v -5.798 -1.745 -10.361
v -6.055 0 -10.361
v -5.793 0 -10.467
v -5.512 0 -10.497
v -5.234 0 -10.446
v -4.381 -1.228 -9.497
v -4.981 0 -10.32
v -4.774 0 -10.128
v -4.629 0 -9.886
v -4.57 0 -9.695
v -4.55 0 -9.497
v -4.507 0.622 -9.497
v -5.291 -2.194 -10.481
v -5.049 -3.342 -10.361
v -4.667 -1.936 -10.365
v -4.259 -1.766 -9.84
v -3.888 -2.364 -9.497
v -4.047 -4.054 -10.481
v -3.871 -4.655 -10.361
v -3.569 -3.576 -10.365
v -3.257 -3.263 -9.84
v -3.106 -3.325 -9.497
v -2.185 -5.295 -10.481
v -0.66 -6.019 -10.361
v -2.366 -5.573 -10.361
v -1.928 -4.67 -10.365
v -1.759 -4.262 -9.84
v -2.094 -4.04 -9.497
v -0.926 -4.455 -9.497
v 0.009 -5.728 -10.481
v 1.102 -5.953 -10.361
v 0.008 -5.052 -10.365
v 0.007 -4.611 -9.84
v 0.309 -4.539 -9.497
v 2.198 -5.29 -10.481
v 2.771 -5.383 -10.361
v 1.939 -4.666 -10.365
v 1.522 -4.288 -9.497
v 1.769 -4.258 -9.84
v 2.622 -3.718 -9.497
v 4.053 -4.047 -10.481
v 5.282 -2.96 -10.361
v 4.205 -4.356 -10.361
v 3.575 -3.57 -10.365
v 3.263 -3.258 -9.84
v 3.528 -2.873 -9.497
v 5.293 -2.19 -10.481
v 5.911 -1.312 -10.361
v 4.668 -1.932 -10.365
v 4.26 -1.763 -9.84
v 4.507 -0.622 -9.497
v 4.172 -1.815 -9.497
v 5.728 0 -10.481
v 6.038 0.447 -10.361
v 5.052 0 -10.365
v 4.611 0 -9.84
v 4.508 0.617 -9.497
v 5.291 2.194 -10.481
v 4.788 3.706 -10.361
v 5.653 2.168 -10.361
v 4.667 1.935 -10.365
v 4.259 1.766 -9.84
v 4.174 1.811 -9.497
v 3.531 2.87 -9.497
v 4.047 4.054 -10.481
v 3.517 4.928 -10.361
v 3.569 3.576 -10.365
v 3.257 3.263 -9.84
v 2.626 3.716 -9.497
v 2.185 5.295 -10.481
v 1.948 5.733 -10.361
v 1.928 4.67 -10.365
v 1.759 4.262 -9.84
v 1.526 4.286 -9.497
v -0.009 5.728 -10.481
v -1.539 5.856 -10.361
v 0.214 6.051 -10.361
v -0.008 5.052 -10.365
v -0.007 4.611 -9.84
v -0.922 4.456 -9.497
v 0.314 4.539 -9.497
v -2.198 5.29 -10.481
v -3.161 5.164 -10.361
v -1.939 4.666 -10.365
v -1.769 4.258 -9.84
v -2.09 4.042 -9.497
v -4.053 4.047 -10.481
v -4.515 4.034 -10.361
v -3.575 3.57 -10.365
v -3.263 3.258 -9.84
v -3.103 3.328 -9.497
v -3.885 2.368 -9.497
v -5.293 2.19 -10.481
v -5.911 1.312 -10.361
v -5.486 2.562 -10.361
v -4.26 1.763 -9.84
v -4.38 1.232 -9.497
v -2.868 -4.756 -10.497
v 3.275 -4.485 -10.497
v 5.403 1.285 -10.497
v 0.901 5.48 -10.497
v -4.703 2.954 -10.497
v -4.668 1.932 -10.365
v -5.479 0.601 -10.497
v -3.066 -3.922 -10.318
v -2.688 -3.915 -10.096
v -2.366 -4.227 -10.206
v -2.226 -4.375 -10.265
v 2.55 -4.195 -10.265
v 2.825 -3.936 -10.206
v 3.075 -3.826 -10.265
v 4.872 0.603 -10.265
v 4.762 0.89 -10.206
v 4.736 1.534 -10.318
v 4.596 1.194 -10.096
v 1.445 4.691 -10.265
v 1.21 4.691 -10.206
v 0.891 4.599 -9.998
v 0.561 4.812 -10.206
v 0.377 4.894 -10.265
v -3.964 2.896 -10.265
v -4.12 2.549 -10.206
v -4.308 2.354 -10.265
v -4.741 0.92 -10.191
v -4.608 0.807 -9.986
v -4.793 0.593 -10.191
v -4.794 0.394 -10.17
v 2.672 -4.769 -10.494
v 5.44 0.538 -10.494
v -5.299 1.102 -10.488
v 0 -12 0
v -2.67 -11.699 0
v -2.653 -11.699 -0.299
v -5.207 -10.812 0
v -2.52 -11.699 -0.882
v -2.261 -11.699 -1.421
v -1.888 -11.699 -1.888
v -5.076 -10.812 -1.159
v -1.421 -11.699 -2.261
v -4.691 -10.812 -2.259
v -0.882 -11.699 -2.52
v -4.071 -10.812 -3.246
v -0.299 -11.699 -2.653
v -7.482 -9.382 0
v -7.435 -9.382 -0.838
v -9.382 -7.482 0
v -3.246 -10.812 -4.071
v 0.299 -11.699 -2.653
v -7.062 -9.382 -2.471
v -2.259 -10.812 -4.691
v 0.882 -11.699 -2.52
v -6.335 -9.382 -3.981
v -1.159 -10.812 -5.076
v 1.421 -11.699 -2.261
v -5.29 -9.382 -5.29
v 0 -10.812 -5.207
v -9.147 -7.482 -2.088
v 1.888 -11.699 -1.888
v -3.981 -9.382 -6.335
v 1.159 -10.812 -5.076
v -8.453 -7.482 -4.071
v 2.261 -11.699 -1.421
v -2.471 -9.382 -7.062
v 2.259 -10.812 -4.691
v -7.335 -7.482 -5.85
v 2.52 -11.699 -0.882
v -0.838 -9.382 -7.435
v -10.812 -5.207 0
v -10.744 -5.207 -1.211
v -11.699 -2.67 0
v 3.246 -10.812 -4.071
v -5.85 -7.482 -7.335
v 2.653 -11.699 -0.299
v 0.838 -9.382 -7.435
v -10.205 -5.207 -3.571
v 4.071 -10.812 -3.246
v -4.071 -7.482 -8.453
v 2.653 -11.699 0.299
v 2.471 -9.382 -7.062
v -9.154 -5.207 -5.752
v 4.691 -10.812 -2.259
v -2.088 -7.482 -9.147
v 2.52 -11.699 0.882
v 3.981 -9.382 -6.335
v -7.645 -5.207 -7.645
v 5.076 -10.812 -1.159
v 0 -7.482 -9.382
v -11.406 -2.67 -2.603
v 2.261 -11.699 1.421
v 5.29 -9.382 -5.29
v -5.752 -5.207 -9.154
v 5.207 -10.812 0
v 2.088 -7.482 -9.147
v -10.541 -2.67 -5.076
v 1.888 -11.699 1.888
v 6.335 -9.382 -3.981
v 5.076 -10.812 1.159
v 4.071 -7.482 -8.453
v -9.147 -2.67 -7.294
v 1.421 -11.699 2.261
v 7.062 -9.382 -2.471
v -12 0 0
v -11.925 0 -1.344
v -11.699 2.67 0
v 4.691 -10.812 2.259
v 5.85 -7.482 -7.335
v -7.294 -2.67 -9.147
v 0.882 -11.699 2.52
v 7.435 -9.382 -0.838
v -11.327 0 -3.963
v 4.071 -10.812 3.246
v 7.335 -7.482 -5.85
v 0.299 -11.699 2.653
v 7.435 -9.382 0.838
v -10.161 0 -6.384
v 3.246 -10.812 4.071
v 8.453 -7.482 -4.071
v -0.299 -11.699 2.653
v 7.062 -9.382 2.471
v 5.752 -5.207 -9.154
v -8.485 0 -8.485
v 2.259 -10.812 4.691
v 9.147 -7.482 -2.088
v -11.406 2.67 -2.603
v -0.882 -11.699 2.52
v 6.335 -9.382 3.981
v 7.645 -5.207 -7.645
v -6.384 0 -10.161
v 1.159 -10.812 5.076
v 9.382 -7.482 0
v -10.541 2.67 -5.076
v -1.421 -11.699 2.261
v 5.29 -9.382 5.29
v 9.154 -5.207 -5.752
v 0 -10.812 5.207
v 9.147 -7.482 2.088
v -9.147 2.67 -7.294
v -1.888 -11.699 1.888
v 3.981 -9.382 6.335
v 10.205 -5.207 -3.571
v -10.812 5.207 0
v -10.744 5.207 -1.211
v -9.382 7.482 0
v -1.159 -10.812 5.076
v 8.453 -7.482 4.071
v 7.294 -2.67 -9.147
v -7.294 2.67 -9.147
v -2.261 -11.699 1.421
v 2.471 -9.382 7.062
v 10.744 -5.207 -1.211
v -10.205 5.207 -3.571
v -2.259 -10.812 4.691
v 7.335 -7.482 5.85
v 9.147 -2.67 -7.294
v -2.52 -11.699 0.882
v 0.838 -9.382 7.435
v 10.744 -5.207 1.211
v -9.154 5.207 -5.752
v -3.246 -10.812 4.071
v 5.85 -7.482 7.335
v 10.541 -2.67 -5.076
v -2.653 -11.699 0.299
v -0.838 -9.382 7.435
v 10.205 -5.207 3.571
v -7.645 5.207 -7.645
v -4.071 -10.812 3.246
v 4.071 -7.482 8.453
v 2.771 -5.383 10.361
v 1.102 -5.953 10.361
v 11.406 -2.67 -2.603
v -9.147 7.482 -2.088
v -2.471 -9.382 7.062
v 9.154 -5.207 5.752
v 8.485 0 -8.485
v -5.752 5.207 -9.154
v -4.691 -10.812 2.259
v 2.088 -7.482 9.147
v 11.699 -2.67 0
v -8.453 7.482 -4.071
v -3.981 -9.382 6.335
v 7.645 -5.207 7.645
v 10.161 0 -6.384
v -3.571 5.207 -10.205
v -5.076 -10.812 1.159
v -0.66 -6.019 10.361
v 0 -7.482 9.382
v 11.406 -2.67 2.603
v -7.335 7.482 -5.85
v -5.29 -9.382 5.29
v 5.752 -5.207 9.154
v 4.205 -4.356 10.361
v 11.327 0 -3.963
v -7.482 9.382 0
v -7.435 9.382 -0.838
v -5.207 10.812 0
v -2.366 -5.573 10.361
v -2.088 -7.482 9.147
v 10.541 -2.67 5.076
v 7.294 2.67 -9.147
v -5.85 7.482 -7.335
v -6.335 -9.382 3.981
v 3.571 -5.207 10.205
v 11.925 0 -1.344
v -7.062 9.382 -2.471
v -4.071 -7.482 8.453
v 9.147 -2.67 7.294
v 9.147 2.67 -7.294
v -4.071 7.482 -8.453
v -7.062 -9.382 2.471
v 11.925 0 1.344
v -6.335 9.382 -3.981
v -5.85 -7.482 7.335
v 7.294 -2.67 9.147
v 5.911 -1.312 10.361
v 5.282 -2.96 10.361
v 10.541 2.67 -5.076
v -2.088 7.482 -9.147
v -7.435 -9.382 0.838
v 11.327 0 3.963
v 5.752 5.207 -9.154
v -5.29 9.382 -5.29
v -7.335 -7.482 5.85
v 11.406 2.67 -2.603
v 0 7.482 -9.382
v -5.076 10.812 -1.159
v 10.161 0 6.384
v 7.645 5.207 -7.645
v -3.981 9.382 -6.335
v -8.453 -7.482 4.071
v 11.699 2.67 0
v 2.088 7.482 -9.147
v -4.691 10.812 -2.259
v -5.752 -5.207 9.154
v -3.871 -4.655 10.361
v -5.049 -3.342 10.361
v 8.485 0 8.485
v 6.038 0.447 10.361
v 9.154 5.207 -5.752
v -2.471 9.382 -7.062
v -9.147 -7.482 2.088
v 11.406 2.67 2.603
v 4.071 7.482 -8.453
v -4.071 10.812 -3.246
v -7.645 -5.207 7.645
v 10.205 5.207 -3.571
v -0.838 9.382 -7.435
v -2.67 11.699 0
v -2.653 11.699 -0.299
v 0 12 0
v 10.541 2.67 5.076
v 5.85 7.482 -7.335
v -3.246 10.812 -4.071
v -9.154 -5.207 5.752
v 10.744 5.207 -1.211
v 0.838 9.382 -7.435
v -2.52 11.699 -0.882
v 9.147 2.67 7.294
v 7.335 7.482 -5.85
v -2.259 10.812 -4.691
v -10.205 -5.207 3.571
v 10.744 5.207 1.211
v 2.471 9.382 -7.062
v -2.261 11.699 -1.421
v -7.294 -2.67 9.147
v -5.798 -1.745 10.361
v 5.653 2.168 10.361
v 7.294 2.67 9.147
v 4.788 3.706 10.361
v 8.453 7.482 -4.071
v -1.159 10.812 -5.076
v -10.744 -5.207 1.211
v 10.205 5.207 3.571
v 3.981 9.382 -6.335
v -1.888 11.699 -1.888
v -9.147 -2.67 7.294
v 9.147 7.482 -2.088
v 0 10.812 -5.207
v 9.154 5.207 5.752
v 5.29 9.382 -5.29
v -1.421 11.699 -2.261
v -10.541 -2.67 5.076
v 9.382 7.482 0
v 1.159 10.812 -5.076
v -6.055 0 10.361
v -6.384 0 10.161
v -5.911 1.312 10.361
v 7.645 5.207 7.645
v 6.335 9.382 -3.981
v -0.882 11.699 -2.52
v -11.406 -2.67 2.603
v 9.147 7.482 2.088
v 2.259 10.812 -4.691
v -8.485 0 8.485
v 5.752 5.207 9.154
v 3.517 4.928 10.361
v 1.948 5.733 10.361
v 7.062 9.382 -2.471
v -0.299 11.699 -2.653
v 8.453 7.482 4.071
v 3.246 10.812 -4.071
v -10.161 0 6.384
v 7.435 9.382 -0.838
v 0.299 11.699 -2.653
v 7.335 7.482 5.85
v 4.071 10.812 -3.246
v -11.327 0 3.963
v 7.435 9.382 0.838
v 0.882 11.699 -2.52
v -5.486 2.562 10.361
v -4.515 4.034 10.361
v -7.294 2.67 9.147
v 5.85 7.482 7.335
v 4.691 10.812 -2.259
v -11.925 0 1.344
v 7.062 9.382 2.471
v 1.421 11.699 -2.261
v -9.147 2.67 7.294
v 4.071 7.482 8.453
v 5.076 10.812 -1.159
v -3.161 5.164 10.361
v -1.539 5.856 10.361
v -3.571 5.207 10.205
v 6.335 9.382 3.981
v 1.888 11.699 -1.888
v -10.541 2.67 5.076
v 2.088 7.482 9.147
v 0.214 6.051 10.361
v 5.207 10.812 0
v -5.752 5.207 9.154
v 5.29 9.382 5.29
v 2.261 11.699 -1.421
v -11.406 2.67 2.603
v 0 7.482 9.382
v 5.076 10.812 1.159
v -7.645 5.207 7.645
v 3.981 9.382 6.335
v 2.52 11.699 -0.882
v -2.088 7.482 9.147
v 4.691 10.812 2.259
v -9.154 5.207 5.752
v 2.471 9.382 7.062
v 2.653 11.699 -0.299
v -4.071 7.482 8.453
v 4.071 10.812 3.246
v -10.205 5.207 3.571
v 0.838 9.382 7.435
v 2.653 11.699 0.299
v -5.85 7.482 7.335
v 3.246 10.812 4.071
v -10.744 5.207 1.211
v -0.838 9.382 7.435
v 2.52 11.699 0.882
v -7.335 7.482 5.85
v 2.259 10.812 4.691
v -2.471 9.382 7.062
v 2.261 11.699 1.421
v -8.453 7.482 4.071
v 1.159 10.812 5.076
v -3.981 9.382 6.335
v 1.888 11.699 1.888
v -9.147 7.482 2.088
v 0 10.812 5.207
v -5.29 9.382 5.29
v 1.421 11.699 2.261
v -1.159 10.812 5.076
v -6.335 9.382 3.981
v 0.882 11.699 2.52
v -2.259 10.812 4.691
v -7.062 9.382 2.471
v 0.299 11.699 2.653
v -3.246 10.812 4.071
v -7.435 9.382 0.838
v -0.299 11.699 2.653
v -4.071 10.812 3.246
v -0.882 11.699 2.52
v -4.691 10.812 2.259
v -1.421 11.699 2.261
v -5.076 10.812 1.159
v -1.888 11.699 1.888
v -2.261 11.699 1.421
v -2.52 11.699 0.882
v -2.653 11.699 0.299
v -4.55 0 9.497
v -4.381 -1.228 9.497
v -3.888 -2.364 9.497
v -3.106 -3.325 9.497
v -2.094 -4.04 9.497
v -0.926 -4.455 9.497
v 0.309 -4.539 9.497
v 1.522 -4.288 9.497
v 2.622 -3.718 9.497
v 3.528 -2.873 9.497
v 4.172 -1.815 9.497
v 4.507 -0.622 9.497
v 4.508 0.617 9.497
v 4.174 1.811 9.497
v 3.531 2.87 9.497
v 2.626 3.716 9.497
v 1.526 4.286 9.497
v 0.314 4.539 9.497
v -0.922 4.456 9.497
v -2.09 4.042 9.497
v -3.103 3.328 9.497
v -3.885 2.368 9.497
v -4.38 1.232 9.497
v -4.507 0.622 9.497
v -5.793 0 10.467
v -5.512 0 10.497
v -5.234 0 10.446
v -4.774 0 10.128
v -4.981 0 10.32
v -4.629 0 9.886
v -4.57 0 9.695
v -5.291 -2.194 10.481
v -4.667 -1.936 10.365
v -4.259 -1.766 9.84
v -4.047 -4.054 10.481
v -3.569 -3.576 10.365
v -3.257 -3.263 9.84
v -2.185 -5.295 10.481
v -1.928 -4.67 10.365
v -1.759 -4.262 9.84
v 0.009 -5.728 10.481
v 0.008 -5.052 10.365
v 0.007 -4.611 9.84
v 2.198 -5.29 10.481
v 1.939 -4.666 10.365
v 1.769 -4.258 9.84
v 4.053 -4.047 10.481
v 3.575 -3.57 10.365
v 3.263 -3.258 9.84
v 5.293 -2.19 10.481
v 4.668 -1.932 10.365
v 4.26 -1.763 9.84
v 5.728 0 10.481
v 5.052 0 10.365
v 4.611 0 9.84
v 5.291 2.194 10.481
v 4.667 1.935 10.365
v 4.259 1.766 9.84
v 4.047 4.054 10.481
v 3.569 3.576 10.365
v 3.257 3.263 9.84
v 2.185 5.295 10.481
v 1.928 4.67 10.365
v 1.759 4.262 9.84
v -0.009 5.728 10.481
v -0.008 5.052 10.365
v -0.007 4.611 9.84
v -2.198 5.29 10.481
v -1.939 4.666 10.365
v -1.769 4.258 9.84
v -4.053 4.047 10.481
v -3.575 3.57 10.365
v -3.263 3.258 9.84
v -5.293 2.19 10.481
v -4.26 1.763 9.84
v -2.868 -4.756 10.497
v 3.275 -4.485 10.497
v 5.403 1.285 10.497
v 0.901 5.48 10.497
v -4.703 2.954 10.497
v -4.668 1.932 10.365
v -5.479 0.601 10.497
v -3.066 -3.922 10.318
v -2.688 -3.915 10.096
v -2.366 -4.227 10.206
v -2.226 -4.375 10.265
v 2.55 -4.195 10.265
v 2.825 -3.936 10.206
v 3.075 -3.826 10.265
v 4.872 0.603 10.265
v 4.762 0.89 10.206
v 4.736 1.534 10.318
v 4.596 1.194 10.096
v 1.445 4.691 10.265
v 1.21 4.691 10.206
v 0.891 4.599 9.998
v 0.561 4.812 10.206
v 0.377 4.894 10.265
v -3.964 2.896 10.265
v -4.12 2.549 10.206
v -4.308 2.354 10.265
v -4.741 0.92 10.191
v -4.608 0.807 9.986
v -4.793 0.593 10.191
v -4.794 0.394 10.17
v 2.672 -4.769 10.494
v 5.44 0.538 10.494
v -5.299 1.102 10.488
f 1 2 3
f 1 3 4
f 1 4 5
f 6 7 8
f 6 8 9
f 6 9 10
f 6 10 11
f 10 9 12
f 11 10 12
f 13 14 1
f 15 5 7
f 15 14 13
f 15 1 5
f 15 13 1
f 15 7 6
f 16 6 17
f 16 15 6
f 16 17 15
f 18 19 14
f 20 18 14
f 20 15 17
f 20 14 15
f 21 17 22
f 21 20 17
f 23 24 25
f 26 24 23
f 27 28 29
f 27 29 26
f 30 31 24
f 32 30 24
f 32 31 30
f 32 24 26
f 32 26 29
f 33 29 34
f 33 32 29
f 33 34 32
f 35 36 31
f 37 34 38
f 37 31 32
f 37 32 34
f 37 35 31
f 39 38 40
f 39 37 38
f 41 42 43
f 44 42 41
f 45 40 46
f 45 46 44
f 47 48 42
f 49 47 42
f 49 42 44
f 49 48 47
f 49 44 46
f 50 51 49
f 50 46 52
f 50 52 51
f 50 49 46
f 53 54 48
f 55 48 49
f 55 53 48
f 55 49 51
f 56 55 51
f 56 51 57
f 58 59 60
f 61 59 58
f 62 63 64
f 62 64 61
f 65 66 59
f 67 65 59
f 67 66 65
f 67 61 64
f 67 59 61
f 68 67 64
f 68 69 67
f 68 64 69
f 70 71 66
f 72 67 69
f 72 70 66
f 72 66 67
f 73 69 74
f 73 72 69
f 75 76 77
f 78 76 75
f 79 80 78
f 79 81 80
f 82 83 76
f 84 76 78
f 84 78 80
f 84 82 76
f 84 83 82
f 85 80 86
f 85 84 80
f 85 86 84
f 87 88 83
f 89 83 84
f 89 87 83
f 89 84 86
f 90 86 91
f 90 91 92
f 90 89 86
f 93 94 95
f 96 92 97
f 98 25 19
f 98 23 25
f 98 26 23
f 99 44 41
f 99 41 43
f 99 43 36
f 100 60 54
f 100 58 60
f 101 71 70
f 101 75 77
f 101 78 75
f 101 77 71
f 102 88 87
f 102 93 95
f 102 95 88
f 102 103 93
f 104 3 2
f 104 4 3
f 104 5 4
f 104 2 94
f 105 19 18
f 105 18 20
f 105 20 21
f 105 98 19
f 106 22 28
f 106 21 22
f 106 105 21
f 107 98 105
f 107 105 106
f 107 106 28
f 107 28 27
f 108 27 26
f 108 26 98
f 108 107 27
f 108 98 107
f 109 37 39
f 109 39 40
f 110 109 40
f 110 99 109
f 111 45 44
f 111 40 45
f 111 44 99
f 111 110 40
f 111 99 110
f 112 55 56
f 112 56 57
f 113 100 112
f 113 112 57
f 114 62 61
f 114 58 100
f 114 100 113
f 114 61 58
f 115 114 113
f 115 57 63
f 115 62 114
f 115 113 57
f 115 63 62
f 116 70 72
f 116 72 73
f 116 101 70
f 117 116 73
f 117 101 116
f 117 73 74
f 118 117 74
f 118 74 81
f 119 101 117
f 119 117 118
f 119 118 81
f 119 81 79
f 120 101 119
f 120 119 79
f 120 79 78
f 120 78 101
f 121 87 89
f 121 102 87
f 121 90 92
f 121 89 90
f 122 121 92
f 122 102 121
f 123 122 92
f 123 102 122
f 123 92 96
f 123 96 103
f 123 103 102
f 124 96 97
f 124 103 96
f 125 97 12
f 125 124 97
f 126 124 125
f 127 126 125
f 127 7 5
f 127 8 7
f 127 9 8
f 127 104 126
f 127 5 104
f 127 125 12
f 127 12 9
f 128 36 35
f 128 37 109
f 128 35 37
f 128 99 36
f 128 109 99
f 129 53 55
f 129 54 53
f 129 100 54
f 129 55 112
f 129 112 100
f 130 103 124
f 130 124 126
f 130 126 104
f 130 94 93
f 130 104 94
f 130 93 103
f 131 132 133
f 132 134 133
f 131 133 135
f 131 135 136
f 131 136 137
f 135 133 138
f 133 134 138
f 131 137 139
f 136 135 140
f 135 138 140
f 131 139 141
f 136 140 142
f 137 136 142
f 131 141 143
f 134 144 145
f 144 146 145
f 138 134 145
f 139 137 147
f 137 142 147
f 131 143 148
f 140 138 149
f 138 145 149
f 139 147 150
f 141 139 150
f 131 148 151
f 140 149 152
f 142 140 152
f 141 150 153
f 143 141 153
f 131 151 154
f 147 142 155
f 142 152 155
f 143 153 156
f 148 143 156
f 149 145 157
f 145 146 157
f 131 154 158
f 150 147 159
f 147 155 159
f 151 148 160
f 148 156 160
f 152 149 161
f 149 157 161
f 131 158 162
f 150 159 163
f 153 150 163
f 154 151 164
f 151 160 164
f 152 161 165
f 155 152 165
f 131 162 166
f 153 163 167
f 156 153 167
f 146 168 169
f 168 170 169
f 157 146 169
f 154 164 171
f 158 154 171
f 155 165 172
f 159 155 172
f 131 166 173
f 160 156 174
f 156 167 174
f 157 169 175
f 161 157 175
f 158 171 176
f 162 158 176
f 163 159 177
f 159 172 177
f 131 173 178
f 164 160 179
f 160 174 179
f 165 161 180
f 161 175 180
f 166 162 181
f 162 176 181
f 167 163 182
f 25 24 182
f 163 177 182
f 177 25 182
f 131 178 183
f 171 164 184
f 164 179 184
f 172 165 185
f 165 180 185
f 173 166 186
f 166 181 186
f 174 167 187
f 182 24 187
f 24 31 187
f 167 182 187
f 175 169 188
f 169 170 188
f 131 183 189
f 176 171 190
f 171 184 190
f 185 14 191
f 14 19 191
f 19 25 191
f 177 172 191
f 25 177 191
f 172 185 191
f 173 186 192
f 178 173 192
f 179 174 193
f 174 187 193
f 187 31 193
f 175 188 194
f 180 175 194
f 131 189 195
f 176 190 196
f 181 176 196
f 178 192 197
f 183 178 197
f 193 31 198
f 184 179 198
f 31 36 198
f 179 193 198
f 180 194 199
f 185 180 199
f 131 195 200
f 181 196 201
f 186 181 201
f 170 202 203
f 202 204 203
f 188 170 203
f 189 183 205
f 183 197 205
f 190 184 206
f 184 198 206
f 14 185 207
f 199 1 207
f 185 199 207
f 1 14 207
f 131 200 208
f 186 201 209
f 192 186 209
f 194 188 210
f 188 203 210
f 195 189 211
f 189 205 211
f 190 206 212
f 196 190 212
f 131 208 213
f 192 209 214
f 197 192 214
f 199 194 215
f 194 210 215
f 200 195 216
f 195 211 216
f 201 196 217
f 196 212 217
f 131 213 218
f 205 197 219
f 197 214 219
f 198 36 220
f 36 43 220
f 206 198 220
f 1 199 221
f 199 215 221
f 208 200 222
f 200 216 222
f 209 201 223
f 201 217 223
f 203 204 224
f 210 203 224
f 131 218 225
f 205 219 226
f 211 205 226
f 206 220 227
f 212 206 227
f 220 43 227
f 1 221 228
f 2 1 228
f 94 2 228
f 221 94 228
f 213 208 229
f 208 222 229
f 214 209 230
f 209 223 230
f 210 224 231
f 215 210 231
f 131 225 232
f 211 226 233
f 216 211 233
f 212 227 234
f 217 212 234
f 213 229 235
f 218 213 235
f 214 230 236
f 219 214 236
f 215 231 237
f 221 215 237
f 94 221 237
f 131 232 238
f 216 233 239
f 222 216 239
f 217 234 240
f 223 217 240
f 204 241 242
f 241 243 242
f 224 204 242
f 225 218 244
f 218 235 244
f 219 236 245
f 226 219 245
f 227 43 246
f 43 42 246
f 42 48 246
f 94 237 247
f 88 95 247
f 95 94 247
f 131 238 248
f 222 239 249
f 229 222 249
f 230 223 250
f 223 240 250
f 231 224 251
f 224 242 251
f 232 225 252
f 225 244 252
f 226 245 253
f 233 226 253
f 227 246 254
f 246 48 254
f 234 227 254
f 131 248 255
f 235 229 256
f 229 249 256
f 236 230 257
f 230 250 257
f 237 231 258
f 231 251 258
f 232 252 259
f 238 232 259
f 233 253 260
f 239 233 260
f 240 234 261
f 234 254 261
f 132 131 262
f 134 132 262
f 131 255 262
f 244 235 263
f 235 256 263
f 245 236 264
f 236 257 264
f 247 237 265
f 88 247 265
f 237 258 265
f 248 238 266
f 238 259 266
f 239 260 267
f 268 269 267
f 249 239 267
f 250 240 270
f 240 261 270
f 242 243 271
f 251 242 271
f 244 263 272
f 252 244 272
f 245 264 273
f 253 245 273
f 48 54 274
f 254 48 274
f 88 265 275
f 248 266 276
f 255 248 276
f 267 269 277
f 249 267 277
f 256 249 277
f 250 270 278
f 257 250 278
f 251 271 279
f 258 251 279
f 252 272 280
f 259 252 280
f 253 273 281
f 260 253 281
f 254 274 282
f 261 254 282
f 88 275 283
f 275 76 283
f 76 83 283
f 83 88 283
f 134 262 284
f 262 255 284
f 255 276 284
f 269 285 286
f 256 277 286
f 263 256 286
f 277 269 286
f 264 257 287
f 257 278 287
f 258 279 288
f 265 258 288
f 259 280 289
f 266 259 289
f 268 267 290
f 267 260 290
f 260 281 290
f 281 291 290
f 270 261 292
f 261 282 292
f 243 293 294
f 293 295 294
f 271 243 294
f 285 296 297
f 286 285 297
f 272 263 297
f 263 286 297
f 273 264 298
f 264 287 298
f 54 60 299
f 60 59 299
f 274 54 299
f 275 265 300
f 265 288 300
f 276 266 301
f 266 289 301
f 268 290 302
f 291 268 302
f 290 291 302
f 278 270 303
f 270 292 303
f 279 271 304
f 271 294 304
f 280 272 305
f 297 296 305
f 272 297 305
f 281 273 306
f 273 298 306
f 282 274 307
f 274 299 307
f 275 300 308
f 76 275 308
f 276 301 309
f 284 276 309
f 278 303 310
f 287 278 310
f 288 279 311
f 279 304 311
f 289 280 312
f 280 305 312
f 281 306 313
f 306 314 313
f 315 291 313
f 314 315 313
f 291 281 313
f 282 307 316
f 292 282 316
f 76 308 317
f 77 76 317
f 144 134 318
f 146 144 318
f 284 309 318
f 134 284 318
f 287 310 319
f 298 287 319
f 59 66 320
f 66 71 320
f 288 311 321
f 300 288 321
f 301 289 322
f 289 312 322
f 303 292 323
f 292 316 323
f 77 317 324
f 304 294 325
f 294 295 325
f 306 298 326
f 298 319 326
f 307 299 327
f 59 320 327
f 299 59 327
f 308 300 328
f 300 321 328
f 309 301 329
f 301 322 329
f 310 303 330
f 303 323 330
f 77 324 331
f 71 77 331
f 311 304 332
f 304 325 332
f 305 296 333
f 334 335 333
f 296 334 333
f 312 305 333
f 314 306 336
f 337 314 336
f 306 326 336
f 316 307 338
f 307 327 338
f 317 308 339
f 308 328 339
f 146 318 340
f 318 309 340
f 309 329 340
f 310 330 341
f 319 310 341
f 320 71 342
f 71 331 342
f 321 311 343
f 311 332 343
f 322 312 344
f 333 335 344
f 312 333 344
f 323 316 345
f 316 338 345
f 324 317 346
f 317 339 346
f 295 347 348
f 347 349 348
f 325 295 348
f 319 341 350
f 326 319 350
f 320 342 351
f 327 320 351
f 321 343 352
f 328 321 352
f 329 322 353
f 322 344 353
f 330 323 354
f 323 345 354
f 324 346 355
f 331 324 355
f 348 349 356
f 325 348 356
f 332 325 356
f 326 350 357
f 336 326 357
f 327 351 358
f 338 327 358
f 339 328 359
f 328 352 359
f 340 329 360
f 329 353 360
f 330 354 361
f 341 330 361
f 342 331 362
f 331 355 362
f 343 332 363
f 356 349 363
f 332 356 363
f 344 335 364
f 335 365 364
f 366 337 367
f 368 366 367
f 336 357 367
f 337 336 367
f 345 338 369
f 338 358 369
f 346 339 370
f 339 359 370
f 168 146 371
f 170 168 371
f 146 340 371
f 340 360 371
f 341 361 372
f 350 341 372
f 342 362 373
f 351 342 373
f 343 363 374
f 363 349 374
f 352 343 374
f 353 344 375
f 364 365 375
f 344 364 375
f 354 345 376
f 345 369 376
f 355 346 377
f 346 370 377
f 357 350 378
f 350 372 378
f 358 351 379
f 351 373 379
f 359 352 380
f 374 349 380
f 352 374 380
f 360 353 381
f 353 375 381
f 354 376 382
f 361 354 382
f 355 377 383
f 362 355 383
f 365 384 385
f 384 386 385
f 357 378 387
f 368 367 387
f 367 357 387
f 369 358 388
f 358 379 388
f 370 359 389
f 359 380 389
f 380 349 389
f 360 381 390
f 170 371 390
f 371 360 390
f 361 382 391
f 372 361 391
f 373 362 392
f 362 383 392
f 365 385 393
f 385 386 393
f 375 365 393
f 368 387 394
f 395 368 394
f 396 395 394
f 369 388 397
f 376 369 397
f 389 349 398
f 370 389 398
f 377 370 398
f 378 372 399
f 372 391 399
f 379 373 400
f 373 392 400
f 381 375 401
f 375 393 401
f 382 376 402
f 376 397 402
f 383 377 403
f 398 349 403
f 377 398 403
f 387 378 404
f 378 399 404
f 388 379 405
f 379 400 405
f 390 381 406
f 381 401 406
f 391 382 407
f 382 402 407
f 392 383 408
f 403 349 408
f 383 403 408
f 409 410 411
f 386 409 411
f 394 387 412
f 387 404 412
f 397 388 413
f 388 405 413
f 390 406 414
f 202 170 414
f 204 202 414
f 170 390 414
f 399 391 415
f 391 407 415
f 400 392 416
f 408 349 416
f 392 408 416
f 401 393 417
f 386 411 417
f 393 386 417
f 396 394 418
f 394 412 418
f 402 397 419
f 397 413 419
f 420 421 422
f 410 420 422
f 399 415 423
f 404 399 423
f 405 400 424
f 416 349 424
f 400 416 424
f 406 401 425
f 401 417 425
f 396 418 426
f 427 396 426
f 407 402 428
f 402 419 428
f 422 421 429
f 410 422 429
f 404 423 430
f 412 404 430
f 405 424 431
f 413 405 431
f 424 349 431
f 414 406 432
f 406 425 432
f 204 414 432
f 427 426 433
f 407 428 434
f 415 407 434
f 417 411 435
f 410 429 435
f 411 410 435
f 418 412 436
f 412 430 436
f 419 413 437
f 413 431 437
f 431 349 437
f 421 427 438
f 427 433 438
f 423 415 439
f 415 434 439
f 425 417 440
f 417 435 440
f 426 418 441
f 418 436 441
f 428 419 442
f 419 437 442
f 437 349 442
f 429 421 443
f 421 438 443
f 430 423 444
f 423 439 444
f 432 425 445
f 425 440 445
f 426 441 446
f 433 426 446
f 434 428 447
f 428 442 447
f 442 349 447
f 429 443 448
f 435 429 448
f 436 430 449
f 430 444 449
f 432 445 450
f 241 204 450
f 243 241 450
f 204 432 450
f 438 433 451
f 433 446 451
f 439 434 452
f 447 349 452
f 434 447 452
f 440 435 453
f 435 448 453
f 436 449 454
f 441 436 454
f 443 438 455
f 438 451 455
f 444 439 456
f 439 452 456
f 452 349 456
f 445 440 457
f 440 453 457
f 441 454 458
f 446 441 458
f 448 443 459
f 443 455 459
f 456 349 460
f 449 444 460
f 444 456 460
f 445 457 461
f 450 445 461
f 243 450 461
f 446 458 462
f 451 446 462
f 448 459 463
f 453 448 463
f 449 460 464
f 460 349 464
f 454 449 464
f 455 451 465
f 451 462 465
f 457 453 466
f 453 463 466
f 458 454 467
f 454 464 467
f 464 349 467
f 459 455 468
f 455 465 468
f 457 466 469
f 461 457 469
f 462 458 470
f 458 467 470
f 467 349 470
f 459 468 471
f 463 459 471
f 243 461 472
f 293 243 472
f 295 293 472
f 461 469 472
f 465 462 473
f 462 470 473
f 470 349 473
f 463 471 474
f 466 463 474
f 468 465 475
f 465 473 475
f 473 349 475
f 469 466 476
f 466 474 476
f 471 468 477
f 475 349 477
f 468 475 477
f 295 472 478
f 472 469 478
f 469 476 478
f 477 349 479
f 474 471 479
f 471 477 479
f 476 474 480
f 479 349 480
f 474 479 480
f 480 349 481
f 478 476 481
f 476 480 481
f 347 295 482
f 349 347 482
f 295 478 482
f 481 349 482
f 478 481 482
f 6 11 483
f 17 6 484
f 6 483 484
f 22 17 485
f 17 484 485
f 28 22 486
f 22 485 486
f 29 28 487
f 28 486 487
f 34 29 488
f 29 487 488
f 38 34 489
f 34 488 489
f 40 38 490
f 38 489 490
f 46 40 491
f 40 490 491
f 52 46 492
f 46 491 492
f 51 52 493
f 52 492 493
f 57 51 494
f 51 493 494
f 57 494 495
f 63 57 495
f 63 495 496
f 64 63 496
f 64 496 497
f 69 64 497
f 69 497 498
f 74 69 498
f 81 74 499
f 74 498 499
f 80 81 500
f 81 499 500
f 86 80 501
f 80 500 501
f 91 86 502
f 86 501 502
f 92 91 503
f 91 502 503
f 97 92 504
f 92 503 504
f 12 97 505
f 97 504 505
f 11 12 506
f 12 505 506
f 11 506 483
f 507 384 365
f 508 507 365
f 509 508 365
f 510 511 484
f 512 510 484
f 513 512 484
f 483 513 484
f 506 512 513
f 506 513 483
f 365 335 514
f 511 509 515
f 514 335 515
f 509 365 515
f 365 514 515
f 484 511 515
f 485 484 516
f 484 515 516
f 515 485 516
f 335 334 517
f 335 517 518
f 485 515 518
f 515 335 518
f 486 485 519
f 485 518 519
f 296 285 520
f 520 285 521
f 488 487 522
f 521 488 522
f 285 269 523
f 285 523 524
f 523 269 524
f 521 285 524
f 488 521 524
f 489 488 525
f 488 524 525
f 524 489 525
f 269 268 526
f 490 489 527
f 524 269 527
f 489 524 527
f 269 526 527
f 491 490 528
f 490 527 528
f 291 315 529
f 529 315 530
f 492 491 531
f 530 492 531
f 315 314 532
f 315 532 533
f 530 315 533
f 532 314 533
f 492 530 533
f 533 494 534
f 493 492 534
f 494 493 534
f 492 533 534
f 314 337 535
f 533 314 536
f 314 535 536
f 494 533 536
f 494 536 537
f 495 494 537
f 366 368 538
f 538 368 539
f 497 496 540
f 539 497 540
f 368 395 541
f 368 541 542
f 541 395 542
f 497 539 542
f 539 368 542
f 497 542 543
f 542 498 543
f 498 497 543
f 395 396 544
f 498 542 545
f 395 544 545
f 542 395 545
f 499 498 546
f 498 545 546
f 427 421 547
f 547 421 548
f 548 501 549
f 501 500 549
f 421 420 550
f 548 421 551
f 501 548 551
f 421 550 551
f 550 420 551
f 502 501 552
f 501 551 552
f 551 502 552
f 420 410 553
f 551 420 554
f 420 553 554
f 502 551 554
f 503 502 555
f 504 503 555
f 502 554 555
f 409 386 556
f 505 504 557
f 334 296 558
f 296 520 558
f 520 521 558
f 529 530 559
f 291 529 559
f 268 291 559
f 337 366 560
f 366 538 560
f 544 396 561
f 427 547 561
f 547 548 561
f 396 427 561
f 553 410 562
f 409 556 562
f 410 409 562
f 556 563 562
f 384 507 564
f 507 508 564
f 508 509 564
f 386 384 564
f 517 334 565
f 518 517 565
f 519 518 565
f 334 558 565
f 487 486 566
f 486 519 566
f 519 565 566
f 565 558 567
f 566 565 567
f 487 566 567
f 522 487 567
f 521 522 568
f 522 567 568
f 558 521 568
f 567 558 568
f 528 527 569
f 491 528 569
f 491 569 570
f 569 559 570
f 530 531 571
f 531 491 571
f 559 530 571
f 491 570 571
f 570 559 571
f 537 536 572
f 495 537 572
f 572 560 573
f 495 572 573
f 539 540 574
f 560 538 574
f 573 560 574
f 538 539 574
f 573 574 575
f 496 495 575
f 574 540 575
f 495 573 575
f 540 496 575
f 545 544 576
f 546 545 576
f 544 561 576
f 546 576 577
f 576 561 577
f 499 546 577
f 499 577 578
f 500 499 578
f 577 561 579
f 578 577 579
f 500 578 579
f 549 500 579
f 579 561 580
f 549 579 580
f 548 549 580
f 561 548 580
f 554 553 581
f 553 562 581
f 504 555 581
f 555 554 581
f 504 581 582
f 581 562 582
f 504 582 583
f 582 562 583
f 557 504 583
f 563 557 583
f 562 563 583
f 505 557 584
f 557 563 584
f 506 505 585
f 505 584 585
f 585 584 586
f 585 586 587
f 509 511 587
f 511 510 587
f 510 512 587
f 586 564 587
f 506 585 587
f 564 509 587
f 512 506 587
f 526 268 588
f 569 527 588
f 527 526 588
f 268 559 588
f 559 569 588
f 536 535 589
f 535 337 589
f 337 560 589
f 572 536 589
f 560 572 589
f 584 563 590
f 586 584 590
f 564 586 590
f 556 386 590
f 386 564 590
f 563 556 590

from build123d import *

# Parameters (mm, degrees)
SKETCH_2_R          = 4.55
CUT_EXTRUDE_1_DEPTH = 15
FILLET_1_R          = 1


with BuildPart() as part:
    # 스케치1 → 회전2 (revolve)
    with BuildSketch(Plane.XY):
        with BuildLine():
            Line((0, 12), (0, -12))
            ThreePointArc((0, -12), (-12, 0), (0, 12))
        make_face()
    revolve(axis=Axis((0, 11.789684906, 0), (0, -1, 0)))

    # 스케치2 → 컷-돌출1 (cut, symmetric)
    with BuildSketch(Plane.XY):
        with Locations(Location((0, 0, 0), (0, 0, 180))):
            Circle(SKETCH_2_R)
    extrude(amount=CUT_EXTRUDE_1_DEPTH, both=True, mode=Mode.SUBTRACT)

    # 필렛1
    fillet_1_edges = [part.edges().sort_by_distance(p)[0] for p in [
        (4.55, 0, 11.103940742),
        (4.55, 0, -11.103940742),
    ]]
    fillet(fillet_1_edges, radius=FILLET_1_R)


solid = part.part
